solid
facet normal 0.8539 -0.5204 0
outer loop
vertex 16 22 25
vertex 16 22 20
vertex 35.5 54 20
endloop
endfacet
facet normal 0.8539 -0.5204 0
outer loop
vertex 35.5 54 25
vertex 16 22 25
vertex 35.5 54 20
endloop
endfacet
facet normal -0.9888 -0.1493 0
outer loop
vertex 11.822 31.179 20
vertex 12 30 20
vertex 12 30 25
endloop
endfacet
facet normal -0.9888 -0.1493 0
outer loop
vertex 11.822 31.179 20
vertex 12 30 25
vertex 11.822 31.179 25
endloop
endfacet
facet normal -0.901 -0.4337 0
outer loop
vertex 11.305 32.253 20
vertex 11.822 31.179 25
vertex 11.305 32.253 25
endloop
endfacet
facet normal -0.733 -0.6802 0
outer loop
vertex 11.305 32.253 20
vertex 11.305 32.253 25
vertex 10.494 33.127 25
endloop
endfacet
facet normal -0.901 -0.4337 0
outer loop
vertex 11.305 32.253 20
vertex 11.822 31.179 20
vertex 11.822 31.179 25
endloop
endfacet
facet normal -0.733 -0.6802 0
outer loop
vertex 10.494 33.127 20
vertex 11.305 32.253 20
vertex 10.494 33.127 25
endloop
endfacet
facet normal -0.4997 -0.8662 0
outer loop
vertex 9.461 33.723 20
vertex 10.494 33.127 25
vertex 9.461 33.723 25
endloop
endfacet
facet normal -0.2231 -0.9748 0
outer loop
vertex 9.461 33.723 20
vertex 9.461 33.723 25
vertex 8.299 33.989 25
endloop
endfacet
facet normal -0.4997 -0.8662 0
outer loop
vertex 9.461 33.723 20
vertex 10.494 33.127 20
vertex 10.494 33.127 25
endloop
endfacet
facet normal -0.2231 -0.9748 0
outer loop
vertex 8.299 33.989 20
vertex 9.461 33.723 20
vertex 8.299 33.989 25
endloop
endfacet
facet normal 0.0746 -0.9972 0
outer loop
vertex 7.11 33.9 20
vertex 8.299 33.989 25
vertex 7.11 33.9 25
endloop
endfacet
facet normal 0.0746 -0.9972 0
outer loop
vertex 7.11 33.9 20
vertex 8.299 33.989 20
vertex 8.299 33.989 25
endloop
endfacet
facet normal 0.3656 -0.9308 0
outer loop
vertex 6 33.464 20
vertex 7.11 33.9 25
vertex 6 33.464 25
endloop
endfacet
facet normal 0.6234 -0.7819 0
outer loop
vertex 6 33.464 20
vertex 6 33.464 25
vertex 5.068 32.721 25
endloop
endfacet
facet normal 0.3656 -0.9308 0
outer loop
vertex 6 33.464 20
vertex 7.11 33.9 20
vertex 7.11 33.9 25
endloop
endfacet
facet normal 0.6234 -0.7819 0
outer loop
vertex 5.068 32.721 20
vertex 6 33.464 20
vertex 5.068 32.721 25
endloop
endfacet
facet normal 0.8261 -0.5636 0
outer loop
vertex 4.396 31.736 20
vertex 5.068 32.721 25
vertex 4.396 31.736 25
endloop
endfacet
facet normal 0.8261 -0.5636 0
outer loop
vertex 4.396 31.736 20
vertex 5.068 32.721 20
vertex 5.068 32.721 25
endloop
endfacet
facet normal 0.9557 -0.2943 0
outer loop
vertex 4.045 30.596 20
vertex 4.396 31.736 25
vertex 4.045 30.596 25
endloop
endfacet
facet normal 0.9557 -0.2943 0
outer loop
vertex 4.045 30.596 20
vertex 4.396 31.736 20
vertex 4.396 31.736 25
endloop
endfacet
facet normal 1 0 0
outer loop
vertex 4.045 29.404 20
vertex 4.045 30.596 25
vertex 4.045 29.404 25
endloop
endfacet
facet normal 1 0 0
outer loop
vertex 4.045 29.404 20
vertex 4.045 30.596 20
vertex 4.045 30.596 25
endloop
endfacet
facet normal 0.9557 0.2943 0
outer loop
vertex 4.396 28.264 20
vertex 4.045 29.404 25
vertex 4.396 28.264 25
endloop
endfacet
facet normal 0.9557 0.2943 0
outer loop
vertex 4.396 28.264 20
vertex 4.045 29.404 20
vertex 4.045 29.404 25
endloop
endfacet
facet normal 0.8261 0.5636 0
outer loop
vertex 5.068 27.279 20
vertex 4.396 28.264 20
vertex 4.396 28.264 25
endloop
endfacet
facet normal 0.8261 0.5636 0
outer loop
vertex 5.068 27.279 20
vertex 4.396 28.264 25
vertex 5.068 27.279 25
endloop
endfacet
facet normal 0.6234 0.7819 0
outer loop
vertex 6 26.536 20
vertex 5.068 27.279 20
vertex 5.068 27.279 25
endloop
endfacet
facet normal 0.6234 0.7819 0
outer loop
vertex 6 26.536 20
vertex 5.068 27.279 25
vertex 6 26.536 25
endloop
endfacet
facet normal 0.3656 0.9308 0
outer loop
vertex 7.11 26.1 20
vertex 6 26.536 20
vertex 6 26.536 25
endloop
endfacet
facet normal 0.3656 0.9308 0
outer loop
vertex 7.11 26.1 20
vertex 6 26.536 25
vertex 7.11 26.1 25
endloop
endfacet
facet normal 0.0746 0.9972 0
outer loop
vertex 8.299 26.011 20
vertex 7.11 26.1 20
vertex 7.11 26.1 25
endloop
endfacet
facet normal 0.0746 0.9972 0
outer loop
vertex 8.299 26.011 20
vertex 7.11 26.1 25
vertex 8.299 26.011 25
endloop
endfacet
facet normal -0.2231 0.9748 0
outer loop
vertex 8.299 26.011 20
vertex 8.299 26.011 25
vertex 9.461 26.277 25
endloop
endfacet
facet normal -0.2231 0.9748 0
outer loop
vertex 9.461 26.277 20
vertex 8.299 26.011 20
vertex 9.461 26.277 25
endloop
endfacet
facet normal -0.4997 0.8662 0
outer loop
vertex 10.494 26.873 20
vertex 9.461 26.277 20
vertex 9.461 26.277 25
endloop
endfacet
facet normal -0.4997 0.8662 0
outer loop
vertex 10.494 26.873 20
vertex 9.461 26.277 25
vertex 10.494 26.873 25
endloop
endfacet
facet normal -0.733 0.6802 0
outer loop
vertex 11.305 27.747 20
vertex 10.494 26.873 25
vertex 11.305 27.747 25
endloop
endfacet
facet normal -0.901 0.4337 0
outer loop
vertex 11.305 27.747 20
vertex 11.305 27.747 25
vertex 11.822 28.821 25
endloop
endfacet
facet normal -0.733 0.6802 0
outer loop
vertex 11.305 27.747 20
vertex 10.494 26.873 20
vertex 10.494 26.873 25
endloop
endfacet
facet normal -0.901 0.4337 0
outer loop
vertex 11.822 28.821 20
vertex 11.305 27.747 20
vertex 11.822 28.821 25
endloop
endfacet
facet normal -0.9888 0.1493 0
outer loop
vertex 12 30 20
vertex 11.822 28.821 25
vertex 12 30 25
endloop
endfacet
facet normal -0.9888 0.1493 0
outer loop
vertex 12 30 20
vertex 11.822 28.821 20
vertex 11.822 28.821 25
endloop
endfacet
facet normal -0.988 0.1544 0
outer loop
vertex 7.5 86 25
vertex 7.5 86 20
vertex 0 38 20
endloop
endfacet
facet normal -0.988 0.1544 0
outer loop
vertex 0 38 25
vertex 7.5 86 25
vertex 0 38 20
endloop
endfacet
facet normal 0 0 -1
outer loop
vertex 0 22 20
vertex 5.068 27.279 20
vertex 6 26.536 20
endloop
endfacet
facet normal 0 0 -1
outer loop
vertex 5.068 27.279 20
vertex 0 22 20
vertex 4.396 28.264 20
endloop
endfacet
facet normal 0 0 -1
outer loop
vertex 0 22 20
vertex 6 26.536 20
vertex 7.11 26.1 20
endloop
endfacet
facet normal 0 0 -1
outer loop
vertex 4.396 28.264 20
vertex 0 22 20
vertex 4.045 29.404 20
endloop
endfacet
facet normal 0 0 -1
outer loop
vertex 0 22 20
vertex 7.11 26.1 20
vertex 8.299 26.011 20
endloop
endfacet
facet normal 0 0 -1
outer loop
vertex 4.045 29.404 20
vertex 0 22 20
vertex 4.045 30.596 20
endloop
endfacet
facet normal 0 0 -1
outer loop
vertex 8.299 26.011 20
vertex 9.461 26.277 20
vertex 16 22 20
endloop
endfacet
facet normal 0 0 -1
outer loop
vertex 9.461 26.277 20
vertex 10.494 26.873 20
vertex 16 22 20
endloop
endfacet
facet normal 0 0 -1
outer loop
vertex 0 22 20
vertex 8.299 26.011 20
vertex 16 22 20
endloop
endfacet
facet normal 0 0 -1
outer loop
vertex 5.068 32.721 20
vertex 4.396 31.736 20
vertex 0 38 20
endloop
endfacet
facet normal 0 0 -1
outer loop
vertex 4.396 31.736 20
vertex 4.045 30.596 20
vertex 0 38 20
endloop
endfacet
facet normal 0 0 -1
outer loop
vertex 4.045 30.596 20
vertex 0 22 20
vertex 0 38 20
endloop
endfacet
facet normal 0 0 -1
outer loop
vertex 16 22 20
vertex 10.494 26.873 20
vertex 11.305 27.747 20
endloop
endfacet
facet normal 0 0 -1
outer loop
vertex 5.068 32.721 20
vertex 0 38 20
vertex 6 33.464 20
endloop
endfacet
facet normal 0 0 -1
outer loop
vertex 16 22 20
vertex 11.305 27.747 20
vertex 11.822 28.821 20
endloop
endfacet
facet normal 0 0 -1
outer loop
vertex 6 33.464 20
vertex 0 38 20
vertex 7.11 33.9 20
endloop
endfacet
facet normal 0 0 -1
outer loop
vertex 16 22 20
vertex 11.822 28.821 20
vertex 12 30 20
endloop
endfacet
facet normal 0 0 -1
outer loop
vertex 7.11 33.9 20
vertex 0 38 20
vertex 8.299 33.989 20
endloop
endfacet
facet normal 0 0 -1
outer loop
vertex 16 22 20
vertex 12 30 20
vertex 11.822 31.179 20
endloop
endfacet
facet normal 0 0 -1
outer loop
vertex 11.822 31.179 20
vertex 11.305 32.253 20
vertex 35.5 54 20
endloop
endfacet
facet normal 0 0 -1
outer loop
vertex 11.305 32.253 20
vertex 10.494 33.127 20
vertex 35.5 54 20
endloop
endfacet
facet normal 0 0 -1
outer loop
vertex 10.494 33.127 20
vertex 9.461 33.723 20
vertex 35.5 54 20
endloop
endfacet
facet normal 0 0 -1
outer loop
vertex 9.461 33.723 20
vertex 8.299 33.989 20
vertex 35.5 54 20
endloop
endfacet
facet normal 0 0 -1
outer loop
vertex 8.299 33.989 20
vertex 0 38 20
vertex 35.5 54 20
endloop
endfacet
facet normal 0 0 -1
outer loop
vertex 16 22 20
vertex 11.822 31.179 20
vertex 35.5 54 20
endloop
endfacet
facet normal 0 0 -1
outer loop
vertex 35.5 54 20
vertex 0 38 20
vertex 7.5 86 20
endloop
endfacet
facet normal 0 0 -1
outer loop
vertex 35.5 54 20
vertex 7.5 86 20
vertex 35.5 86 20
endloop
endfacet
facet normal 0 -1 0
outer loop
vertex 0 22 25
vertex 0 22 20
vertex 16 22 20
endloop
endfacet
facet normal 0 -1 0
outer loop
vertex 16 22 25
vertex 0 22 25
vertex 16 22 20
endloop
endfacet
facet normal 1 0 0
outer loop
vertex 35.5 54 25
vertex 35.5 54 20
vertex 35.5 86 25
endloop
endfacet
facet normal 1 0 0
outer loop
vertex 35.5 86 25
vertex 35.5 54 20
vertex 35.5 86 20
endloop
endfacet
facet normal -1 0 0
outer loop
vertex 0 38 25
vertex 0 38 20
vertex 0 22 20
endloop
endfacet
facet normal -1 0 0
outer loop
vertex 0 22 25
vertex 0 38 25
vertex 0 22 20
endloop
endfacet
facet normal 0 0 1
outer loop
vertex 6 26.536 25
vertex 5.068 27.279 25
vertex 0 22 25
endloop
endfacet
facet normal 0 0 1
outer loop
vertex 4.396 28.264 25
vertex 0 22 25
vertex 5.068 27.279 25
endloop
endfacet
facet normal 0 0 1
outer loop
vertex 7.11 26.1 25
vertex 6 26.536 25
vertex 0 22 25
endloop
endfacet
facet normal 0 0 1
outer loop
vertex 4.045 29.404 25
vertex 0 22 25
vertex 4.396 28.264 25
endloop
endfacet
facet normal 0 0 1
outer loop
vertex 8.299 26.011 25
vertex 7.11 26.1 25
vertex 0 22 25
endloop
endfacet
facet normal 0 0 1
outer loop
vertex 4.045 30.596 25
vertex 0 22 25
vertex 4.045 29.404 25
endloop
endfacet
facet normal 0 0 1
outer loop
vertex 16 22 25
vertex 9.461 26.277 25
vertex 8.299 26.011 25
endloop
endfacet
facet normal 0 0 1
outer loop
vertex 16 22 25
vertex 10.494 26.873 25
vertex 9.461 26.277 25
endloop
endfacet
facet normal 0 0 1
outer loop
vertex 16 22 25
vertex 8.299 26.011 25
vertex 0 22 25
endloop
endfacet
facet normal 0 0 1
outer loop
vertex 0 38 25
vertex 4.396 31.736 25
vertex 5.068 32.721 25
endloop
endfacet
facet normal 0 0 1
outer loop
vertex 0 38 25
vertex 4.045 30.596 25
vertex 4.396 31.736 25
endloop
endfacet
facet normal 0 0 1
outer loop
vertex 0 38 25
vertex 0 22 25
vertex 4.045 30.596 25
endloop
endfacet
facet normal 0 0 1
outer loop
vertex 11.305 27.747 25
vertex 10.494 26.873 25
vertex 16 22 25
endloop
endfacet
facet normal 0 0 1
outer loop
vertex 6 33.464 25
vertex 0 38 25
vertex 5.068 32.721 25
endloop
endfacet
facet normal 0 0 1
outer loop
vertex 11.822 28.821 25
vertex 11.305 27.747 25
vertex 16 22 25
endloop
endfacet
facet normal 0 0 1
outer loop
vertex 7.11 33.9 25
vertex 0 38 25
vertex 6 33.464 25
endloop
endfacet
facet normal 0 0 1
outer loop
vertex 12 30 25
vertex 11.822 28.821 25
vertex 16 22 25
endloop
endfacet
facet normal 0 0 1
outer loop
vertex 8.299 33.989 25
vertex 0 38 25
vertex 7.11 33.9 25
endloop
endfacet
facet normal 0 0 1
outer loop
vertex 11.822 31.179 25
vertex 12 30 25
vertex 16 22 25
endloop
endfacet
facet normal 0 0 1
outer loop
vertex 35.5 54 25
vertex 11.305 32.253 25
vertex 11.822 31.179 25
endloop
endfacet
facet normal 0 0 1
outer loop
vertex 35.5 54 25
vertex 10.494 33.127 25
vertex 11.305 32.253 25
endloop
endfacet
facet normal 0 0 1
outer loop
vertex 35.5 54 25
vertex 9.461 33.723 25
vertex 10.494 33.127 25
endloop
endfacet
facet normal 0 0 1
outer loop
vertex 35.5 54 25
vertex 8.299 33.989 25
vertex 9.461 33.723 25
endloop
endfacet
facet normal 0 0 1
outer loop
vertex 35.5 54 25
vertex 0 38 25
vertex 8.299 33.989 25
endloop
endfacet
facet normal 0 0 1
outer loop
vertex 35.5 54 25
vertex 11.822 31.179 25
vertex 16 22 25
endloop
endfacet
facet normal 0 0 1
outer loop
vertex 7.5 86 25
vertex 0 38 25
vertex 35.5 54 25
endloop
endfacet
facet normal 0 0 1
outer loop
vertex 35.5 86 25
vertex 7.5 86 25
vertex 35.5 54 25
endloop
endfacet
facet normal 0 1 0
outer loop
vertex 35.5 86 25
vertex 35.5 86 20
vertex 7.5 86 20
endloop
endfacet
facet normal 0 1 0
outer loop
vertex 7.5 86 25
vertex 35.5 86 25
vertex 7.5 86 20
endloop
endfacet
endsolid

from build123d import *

# Parameters (mm, degrees)
EXTRUDE_START   = 20
SKETCH_1_R      = 4
EXTRUDE_1_DEPTH = 5


with BuildPart() as part:
    # ｽｹｯﾁ1 → ﾎﾞｽ - 押し出し1 (new body)
    with BuildSketch(Plane.XY.offset(EXTRUDE_START)):
        Polygon((0, 22), (16, 22), (35.5, 54), (35.5, 86), (7.5, 86), (0, 38), align=None)
        with Locations((8, 30)):
            Circle(SKETCH_1_R, mode=Mode.SUBTRACT)
    extrude(amount=EXTRUDE_1_DEPTH)


solid = part.part
